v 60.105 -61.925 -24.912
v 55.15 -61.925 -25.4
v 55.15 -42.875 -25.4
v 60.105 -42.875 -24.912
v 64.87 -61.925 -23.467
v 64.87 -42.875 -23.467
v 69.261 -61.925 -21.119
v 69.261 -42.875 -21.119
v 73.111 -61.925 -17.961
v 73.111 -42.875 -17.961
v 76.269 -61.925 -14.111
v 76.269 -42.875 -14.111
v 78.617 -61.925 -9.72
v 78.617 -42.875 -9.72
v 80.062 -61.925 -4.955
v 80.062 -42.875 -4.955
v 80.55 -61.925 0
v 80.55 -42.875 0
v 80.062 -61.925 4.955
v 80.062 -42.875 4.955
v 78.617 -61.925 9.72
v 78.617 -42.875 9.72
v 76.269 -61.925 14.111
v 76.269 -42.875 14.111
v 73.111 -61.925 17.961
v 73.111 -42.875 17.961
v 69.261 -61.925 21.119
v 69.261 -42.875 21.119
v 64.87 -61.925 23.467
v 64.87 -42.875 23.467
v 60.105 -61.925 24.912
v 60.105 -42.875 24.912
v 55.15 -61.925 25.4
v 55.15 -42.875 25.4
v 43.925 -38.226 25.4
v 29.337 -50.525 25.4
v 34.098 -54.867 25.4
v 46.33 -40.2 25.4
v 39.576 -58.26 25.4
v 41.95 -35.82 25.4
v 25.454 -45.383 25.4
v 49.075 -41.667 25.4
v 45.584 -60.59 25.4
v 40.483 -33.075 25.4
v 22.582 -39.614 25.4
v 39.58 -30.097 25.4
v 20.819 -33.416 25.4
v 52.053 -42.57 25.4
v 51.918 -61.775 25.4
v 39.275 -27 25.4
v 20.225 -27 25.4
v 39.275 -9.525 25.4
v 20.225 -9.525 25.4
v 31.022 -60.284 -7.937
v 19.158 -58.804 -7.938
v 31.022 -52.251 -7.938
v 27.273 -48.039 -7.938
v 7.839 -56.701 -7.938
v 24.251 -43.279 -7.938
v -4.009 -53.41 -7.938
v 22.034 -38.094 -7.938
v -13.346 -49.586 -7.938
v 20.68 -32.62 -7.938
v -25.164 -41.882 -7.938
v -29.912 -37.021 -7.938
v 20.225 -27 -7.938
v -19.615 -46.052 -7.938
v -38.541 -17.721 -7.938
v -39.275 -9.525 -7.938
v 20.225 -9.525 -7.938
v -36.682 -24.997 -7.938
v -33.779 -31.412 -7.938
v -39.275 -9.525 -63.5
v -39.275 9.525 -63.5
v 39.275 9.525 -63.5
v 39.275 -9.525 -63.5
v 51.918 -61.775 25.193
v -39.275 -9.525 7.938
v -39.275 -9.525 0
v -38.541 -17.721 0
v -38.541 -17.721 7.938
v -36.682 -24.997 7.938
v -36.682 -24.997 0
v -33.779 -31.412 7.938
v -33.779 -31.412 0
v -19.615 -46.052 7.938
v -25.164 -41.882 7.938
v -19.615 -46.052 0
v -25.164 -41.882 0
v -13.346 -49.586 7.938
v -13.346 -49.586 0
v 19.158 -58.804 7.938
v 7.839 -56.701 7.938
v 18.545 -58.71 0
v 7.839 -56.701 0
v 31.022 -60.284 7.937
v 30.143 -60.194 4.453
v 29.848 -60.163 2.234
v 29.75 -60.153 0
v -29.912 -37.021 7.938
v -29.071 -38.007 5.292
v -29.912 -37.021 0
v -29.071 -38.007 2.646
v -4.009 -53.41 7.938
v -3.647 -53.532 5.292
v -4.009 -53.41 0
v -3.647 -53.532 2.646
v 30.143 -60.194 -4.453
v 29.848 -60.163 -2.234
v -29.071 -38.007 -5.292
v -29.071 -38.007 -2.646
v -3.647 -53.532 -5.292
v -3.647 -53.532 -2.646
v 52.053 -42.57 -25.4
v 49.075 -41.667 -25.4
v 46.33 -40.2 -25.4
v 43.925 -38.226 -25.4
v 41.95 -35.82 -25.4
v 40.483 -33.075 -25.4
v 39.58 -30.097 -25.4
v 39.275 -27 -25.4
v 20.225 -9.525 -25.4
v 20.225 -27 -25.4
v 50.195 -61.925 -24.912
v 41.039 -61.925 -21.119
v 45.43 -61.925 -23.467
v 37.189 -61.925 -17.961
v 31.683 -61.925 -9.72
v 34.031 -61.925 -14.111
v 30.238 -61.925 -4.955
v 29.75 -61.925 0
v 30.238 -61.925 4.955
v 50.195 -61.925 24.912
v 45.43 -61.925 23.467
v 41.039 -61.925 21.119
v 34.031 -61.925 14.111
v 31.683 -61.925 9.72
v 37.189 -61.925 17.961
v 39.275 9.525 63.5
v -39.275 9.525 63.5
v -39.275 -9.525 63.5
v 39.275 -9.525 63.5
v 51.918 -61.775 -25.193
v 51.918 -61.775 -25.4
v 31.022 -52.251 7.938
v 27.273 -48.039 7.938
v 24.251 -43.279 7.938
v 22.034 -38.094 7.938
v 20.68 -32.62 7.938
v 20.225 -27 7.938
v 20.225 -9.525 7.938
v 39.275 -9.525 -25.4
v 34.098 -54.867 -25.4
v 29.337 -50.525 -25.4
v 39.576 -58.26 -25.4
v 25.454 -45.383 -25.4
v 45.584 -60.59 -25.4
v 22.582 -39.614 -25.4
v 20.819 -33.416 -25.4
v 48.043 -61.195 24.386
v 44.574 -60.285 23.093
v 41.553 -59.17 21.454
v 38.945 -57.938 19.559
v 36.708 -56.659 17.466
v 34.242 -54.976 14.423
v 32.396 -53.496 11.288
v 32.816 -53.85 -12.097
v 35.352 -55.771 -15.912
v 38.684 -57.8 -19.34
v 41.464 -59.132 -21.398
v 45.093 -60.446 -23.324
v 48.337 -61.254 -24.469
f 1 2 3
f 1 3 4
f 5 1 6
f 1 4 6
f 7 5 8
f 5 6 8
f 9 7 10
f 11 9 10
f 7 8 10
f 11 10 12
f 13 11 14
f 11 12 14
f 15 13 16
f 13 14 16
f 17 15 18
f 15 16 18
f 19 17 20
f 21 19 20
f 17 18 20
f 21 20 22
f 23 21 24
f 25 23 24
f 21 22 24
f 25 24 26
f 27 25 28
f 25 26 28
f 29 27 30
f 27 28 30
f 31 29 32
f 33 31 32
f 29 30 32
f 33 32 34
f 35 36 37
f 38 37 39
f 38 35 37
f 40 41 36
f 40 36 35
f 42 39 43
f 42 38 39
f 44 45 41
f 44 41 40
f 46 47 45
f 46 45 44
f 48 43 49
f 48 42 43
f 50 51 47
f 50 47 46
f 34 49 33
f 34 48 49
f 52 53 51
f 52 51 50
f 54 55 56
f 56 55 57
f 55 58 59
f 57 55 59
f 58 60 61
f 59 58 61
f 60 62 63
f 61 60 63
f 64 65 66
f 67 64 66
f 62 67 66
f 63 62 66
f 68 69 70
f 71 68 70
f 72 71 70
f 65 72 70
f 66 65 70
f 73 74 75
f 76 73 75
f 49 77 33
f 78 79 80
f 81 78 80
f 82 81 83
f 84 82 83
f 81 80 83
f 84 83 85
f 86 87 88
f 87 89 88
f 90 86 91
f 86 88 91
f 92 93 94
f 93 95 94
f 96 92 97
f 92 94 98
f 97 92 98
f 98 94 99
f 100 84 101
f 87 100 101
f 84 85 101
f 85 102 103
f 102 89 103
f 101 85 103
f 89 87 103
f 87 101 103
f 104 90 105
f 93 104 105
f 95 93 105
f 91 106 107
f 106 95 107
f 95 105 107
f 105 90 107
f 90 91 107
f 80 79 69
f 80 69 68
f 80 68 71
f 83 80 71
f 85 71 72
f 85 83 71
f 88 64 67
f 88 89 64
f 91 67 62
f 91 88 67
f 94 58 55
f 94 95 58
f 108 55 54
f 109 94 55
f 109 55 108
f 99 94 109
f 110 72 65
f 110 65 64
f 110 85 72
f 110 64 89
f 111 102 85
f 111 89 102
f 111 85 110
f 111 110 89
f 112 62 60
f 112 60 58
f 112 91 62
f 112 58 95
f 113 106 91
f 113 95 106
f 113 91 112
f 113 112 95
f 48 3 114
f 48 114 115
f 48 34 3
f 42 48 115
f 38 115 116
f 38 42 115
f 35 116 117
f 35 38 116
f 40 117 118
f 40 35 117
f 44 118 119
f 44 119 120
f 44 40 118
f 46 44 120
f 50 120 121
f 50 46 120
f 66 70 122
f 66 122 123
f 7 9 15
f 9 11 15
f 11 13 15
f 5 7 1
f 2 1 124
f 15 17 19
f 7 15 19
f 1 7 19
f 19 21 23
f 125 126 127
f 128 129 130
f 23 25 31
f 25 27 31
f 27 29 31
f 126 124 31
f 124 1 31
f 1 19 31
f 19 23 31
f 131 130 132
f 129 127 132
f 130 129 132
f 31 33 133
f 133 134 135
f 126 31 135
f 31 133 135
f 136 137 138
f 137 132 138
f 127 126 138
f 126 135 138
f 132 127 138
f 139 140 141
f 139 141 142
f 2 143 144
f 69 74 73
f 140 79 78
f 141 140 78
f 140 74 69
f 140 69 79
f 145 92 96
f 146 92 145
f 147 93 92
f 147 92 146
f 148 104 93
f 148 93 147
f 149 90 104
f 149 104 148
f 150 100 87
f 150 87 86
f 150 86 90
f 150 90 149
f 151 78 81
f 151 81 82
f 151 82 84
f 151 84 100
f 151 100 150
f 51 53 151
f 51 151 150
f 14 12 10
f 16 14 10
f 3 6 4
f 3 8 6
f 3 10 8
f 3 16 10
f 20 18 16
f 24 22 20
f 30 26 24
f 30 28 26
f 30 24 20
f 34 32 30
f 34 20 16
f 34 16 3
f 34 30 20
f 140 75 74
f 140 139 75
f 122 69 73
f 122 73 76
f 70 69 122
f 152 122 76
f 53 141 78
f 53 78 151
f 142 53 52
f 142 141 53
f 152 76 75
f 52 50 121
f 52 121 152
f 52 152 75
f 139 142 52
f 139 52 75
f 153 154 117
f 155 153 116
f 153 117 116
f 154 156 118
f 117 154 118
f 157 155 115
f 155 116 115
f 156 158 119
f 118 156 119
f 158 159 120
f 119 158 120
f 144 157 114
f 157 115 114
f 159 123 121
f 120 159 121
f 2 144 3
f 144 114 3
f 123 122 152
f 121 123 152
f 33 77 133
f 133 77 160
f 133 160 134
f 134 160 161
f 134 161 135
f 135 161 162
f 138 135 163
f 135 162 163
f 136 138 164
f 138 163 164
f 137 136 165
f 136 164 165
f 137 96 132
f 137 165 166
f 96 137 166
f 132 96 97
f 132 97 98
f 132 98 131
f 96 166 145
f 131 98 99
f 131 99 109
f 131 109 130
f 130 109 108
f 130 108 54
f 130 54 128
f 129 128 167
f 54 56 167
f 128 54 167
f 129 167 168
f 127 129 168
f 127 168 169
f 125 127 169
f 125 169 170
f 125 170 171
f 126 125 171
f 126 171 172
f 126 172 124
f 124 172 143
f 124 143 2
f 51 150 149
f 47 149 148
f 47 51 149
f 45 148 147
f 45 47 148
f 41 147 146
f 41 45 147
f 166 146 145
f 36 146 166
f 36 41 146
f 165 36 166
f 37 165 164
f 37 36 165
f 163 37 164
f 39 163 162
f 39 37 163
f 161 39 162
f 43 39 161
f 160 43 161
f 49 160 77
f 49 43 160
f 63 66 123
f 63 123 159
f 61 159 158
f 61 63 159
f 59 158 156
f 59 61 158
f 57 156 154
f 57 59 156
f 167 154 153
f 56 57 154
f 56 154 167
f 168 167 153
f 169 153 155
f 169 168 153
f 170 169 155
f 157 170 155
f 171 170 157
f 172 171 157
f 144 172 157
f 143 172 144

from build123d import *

# Parameters (mm, degrees)
F1_DEPTH = 63.5
F2_DEPTH = 25.4
F3_DEPTH = 7.9375
F0_W     = 25.4
F0_H     = 19.0500014678


with BuildPart() as f1:
    # F0 (on Top) → F1 (new body, symmetric)
    with BuildSketch(Plane.XY):
        Polygon((39.2749942839, 9.525), (-39.2749942839, 9.525), (-39.2749942839, -9.525), (20.2249928161, -9.525), (39.2749942839, -9.525), align=None)
    extrude(amount=F1_DEPTH, both=True)

    # F0 (on Top) → F2 (join, symmetric)
    with BuildSketch(Plane.XY):
        with BuildLine():
            Line((39.2749942839, -27.0002), (39.2749942839, -9.525))
            Line((39.2749942839, -9.525), (20.2249928161, -9.525))
            Line((20.2249928161, -9.525), (20.2249928161, -27.0002))
            ThreePointArc((20.2249928161, -27.0002), (29.3367398508, -50.5253274831), (51.9175683258, -61.7752938165))
            add(Edge.make_bspline(
                [(51.9175683258, -61.7752938165), (52.9952696281, -61.8278519925), (54.0729461799, -61.8776803226), (55.1499942839, -61.9252014678)],
                knots=[105.4761775762, 105.4761775762, 105.4761775762, 105.4761775762, 107.990090193, 107.990090193, 107.990090193, 107.990090193], degree=3))
            Line((55.1499942839, -61.9252014678), (55.1499942839, -42.8752))
            ThreePointArc((55.1499942839, -42.8752), (43.9246741326, -38.2255201513), (39.2749942839, -27.0002))
        make_face()
    extrude(amount=F2_DEPTH, both=True)

    # F0 (on Top) → F3 (join, symmetric)
    with BuildSketch(Plane.XY):
        with BuildLine():
            Line((20.2249928161, -9.525), (-39.2749942839, -9.525))
            add(Edge.make_bspline(
                [(-39.2749942839, -9.525), (-38.560182874, -52.5593411678), (6.7004779731, -59.5701115574), (51.9175683258, -61.7752938165)],
                knots=[0, 0, 0, 0, 105.4761775762, 105.4761775762, 105.4761775762, 105.4761775762], degree=3))
            ThreePointArc((51.9175683258, -61.7752938165), (29.3367398508, -50.5253274831), (20.2249928161, -27.0002))
            Line((20.2249928161, -27.0002), (20.2249928161, -9.525))
        make_face()
    extrude(amount=F3_DEPTH, both=True)

    # F0 (on Top) → F4 (revolve)
    with BuildSketch(Plane.XY):
        with Locations((67.8499942839, -52.4002007339)):
            Rectangle(F0_W, F0_H)
    revolve(axis=Axis((55.1499942839, -52.3875, 0), (0, -1, 0)))


solid = f1.part
